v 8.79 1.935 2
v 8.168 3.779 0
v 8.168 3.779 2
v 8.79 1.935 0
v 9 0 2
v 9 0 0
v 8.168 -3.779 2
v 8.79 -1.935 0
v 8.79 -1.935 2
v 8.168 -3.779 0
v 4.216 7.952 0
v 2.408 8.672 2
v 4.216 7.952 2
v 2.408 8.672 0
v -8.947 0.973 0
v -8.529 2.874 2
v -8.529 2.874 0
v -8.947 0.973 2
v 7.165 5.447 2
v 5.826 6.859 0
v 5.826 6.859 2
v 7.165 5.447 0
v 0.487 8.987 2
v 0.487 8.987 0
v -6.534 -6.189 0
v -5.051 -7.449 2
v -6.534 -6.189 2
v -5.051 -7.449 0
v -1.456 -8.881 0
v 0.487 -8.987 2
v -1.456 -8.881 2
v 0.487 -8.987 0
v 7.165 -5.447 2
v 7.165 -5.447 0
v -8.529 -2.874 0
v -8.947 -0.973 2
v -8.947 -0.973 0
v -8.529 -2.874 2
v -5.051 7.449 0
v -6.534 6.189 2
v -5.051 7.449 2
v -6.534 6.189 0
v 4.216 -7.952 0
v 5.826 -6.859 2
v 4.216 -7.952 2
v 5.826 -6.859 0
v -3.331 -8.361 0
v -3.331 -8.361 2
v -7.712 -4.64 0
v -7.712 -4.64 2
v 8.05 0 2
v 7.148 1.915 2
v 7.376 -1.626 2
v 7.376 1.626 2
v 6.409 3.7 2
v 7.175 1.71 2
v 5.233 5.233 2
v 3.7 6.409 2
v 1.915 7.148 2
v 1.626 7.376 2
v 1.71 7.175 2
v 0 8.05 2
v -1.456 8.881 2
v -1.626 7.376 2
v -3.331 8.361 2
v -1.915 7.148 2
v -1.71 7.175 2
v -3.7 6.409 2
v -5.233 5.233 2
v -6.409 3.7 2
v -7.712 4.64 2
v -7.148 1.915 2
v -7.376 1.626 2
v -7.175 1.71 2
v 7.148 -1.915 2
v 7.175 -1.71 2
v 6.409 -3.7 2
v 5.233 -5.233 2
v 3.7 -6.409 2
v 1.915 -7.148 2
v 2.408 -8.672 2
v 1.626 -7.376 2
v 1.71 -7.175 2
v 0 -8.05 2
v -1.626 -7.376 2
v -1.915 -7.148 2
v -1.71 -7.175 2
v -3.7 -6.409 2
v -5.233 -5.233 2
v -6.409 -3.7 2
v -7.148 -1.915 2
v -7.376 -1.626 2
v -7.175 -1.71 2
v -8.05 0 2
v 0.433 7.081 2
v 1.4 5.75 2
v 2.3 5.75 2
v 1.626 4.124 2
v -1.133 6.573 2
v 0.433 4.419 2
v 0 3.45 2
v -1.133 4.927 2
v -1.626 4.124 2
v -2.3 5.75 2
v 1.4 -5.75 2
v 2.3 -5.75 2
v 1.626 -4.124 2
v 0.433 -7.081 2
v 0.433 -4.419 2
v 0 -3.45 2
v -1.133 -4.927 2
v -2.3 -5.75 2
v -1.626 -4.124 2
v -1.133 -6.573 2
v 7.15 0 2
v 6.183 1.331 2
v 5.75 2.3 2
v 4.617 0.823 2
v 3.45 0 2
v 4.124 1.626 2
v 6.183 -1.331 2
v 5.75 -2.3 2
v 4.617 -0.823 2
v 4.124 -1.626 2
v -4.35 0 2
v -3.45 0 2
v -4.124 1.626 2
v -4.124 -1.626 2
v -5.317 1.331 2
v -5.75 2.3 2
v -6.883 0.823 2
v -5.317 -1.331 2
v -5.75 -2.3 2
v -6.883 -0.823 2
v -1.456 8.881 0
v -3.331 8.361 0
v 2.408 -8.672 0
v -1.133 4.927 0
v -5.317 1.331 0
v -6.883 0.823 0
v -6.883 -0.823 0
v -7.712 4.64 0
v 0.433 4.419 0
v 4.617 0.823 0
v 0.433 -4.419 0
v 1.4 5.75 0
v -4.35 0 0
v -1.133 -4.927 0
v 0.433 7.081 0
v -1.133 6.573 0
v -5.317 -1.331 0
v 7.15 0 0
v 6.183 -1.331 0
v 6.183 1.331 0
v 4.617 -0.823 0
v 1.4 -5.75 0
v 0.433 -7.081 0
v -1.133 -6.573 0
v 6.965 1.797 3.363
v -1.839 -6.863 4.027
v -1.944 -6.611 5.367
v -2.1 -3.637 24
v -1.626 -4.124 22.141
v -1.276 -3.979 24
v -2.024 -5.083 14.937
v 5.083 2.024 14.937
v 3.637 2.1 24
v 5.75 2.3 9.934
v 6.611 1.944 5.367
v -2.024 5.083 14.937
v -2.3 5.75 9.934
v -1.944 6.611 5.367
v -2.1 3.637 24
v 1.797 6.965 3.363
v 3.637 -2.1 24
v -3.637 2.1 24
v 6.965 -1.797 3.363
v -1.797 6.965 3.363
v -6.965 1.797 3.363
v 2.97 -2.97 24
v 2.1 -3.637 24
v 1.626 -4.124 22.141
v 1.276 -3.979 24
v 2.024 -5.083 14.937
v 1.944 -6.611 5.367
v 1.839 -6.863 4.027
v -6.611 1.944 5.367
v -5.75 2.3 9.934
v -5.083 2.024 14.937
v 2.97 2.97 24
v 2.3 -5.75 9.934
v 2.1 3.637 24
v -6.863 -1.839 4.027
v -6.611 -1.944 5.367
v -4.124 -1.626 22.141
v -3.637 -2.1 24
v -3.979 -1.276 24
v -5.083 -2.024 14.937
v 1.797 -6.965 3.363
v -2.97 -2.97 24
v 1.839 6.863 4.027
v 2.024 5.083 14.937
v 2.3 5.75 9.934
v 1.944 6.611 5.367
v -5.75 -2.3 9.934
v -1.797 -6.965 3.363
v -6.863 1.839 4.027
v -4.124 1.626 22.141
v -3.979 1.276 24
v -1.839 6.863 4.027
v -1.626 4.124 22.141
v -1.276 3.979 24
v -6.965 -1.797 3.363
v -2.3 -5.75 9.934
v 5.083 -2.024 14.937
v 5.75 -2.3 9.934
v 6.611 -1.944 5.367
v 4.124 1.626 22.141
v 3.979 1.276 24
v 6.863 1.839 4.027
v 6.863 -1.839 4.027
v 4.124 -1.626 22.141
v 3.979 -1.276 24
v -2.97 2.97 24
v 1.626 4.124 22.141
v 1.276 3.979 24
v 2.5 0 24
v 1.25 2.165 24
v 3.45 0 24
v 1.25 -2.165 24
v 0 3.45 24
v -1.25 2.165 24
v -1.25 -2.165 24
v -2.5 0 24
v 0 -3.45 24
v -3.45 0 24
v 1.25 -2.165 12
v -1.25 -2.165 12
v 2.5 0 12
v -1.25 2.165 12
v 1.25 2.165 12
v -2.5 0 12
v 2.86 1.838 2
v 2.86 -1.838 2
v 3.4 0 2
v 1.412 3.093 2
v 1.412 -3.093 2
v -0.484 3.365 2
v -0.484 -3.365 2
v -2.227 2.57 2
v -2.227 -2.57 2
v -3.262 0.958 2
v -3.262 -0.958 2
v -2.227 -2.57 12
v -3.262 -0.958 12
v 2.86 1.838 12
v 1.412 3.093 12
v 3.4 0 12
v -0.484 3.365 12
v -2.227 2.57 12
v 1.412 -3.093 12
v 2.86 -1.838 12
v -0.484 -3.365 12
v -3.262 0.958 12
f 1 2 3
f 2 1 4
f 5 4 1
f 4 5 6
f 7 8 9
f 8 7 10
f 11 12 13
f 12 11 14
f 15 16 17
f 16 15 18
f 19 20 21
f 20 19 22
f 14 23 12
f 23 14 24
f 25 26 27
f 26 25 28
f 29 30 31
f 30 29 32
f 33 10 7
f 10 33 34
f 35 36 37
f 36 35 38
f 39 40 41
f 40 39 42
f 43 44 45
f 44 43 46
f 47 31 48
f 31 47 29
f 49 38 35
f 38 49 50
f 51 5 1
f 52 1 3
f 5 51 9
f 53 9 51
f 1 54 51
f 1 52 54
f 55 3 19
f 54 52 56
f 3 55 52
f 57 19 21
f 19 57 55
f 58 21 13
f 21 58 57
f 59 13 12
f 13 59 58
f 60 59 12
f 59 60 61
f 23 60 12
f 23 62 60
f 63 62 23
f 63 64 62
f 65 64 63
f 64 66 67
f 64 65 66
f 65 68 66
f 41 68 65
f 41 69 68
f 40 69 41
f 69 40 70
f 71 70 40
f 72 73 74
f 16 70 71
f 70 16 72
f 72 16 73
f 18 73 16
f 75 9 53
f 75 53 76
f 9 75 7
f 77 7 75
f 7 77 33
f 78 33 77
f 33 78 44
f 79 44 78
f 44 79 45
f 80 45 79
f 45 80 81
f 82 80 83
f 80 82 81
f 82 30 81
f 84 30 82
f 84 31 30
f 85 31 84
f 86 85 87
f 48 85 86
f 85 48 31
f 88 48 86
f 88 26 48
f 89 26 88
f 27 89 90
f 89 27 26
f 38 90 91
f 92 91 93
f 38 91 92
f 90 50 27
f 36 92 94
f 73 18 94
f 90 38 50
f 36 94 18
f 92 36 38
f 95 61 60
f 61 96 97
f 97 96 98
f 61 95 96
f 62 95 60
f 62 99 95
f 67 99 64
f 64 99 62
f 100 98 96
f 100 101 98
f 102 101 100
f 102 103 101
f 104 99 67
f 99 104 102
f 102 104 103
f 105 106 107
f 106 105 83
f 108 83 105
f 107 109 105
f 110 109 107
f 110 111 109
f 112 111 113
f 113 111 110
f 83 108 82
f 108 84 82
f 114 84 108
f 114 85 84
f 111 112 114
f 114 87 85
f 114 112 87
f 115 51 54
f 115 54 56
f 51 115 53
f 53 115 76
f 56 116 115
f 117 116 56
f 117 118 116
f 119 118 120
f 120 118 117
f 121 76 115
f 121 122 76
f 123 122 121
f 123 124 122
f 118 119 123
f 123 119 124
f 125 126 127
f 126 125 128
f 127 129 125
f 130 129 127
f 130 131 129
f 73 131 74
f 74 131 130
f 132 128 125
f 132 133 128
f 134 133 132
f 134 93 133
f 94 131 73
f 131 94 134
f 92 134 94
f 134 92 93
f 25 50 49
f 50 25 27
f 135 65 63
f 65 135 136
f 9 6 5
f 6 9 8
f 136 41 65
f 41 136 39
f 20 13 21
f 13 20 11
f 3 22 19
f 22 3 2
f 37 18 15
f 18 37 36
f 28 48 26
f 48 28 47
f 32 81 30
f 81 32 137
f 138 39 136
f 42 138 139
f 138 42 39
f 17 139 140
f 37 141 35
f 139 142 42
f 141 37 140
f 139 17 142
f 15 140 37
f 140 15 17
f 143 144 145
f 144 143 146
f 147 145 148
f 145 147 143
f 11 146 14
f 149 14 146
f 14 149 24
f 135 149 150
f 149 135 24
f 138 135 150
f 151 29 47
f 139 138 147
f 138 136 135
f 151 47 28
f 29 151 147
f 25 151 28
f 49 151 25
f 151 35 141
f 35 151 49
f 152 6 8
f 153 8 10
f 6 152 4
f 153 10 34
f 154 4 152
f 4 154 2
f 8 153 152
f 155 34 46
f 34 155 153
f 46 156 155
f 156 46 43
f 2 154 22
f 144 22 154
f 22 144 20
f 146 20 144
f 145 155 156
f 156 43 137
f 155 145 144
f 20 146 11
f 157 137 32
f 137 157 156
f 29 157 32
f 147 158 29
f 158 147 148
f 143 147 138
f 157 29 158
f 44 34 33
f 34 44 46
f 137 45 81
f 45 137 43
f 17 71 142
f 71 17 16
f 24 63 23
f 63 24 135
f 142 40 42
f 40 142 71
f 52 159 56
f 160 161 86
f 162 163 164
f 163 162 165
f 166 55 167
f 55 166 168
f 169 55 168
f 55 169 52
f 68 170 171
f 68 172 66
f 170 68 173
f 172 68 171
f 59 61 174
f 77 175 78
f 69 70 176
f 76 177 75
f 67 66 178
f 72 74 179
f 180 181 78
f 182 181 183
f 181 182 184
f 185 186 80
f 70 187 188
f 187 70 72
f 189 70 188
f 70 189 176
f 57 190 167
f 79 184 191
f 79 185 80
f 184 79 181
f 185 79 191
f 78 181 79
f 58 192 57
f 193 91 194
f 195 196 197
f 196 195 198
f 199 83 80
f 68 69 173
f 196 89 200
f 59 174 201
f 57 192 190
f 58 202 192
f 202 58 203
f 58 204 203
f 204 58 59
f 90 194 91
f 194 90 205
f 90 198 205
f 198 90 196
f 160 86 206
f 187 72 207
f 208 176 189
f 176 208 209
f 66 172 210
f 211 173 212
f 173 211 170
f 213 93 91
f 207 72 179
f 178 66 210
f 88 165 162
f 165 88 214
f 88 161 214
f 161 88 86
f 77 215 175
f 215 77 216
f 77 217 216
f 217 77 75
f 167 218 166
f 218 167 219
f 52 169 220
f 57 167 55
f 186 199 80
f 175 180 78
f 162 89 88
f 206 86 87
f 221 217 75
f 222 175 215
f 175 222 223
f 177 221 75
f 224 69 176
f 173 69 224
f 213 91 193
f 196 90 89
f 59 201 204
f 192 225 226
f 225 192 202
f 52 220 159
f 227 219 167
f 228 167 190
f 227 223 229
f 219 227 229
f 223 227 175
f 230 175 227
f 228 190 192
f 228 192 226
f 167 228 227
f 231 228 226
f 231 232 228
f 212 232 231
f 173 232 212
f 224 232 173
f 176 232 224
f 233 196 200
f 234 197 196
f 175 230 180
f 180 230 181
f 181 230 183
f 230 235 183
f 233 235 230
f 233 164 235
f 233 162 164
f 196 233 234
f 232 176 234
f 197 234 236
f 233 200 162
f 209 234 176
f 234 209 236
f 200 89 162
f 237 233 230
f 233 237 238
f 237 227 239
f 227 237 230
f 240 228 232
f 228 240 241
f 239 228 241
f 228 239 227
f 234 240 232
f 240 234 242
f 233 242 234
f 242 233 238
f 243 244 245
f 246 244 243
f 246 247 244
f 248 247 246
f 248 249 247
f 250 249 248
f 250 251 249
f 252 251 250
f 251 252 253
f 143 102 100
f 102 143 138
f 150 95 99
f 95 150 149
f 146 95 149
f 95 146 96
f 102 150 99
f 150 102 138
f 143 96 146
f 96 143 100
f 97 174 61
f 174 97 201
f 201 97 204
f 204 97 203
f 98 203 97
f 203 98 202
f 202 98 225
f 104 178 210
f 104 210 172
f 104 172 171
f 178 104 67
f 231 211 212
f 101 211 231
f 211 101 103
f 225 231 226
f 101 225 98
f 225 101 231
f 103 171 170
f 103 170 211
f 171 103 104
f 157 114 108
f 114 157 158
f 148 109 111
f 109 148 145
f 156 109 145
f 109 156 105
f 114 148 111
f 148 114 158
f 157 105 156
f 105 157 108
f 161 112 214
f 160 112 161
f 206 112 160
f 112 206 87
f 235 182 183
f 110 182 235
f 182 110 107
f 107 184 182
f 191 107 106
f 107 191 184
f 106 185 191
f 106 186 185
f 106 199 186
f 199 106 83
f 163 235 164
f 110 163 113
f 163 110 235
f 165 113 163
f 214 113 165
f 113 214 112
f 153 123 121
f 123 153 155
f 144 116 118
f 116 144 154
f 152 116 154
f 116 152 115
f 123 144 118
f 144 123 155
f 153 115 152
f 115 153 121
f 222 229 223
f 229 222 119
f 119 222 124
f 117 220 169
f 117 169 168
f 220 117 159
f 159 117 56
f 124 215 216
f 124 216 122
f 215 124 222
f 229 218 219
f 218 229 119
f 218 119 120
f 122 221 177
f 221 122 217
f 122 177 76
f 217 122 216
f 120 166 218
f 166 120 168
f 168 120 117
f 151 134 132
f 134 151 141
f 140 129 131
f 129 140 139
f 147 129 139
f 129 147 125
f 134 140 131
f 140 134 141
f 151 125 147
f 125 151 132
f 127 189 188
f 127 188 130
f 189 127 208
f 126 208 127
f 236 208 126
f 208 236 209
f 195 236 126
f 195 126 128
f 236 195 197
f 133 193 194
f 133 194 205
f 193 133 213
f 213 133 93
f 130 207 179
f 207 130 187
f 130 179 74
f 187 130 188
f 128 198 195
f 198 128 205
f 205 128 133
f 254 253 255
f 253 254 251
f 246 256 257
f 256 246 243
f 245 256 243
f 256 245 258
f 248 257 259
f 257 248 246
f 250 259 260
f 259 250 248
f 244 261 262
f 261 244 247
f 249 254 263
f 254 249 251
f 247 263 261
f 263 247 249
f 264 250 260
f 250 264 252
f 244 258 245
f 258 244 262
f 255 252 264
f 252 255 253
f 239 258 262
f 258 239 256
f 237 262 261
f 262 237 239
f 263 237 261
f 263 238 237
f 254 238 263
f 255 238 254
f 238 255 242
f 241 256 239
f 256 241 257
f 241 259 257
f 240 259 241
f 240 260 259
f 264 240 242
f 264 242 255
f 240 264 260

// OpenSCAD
plate_radius = 9;
plate_thickness = 2;
chuck_height = 22;
chuck_radius = 4.2;
chuck_base_radius = 7.4; // Wider base for the cone
screw_hole_radius = 1.4;
screw_hole_offset = 5.75;
top_cylinder_height = chuck_height + 2; // Height of cylinders above screw holes
top_cylinder_radius = 2.3; // Radius of cylinders above screw holes

module solid_parts() {
  // Chuck plate
  cylinder(h=plate_thickness, r=plate_radius);

  // Chuck shaft
  translate([0, 0, plate_thickness]) {
    cylinder(h=chuck_height, r1=chuck_base_radius, r2=chuck_radius);
  }
}

module plat_screw_hole() {
  cylinder(h=plate_thickness + 2, r=screw_hole_radius);
}

module magnet_cavity() {
  cylinder(h=10, r=3.4);
}

difference() {
  solid_parts();

  translate([0, 0, plate_thickness]) {
    cylinder(h=chuck_height + 1, r=2.5, $fn=6);
  }

  // Screw holes with cylinders above them
  translate([0, screw_hole_offset, -1]) {
    plat_screw_hole();
  }
  translate([0, screw_hole_offset, plate_thickness]) {
    cylinder(h=top_cylinder_height, r=top_cylinder_radius);
  }

  translate([0, -screw_hole_offset, -1]) {
    plat_screw_hole();
  }
  translate([0, -screw_hole_offset, plate_thickness]) {
    cylinder(h=top_cylinder_height, r=top_cylinder_radius);
  }

  translate([screw_hole_offset, 0, -1]) {
    plat_screw_hole();
  }
  translate([screw_hole_offset, 0, plate_thickness]) {
    cylinder(h=top_cylinder_height, r=top_cylinder_radius);
  }

  translate([-screw_hole_offset, 0, -1]) {
    plat_screw_hole();
  }
  translate([-screw_hole_offset, 0, plate_thickness]) {
    cylinder(h=top_cylinder_height, r=top_cylinder_radius);
  }

  translate([0, 0, plate_thickness]) {
    magnet_cavity();
  }
}
